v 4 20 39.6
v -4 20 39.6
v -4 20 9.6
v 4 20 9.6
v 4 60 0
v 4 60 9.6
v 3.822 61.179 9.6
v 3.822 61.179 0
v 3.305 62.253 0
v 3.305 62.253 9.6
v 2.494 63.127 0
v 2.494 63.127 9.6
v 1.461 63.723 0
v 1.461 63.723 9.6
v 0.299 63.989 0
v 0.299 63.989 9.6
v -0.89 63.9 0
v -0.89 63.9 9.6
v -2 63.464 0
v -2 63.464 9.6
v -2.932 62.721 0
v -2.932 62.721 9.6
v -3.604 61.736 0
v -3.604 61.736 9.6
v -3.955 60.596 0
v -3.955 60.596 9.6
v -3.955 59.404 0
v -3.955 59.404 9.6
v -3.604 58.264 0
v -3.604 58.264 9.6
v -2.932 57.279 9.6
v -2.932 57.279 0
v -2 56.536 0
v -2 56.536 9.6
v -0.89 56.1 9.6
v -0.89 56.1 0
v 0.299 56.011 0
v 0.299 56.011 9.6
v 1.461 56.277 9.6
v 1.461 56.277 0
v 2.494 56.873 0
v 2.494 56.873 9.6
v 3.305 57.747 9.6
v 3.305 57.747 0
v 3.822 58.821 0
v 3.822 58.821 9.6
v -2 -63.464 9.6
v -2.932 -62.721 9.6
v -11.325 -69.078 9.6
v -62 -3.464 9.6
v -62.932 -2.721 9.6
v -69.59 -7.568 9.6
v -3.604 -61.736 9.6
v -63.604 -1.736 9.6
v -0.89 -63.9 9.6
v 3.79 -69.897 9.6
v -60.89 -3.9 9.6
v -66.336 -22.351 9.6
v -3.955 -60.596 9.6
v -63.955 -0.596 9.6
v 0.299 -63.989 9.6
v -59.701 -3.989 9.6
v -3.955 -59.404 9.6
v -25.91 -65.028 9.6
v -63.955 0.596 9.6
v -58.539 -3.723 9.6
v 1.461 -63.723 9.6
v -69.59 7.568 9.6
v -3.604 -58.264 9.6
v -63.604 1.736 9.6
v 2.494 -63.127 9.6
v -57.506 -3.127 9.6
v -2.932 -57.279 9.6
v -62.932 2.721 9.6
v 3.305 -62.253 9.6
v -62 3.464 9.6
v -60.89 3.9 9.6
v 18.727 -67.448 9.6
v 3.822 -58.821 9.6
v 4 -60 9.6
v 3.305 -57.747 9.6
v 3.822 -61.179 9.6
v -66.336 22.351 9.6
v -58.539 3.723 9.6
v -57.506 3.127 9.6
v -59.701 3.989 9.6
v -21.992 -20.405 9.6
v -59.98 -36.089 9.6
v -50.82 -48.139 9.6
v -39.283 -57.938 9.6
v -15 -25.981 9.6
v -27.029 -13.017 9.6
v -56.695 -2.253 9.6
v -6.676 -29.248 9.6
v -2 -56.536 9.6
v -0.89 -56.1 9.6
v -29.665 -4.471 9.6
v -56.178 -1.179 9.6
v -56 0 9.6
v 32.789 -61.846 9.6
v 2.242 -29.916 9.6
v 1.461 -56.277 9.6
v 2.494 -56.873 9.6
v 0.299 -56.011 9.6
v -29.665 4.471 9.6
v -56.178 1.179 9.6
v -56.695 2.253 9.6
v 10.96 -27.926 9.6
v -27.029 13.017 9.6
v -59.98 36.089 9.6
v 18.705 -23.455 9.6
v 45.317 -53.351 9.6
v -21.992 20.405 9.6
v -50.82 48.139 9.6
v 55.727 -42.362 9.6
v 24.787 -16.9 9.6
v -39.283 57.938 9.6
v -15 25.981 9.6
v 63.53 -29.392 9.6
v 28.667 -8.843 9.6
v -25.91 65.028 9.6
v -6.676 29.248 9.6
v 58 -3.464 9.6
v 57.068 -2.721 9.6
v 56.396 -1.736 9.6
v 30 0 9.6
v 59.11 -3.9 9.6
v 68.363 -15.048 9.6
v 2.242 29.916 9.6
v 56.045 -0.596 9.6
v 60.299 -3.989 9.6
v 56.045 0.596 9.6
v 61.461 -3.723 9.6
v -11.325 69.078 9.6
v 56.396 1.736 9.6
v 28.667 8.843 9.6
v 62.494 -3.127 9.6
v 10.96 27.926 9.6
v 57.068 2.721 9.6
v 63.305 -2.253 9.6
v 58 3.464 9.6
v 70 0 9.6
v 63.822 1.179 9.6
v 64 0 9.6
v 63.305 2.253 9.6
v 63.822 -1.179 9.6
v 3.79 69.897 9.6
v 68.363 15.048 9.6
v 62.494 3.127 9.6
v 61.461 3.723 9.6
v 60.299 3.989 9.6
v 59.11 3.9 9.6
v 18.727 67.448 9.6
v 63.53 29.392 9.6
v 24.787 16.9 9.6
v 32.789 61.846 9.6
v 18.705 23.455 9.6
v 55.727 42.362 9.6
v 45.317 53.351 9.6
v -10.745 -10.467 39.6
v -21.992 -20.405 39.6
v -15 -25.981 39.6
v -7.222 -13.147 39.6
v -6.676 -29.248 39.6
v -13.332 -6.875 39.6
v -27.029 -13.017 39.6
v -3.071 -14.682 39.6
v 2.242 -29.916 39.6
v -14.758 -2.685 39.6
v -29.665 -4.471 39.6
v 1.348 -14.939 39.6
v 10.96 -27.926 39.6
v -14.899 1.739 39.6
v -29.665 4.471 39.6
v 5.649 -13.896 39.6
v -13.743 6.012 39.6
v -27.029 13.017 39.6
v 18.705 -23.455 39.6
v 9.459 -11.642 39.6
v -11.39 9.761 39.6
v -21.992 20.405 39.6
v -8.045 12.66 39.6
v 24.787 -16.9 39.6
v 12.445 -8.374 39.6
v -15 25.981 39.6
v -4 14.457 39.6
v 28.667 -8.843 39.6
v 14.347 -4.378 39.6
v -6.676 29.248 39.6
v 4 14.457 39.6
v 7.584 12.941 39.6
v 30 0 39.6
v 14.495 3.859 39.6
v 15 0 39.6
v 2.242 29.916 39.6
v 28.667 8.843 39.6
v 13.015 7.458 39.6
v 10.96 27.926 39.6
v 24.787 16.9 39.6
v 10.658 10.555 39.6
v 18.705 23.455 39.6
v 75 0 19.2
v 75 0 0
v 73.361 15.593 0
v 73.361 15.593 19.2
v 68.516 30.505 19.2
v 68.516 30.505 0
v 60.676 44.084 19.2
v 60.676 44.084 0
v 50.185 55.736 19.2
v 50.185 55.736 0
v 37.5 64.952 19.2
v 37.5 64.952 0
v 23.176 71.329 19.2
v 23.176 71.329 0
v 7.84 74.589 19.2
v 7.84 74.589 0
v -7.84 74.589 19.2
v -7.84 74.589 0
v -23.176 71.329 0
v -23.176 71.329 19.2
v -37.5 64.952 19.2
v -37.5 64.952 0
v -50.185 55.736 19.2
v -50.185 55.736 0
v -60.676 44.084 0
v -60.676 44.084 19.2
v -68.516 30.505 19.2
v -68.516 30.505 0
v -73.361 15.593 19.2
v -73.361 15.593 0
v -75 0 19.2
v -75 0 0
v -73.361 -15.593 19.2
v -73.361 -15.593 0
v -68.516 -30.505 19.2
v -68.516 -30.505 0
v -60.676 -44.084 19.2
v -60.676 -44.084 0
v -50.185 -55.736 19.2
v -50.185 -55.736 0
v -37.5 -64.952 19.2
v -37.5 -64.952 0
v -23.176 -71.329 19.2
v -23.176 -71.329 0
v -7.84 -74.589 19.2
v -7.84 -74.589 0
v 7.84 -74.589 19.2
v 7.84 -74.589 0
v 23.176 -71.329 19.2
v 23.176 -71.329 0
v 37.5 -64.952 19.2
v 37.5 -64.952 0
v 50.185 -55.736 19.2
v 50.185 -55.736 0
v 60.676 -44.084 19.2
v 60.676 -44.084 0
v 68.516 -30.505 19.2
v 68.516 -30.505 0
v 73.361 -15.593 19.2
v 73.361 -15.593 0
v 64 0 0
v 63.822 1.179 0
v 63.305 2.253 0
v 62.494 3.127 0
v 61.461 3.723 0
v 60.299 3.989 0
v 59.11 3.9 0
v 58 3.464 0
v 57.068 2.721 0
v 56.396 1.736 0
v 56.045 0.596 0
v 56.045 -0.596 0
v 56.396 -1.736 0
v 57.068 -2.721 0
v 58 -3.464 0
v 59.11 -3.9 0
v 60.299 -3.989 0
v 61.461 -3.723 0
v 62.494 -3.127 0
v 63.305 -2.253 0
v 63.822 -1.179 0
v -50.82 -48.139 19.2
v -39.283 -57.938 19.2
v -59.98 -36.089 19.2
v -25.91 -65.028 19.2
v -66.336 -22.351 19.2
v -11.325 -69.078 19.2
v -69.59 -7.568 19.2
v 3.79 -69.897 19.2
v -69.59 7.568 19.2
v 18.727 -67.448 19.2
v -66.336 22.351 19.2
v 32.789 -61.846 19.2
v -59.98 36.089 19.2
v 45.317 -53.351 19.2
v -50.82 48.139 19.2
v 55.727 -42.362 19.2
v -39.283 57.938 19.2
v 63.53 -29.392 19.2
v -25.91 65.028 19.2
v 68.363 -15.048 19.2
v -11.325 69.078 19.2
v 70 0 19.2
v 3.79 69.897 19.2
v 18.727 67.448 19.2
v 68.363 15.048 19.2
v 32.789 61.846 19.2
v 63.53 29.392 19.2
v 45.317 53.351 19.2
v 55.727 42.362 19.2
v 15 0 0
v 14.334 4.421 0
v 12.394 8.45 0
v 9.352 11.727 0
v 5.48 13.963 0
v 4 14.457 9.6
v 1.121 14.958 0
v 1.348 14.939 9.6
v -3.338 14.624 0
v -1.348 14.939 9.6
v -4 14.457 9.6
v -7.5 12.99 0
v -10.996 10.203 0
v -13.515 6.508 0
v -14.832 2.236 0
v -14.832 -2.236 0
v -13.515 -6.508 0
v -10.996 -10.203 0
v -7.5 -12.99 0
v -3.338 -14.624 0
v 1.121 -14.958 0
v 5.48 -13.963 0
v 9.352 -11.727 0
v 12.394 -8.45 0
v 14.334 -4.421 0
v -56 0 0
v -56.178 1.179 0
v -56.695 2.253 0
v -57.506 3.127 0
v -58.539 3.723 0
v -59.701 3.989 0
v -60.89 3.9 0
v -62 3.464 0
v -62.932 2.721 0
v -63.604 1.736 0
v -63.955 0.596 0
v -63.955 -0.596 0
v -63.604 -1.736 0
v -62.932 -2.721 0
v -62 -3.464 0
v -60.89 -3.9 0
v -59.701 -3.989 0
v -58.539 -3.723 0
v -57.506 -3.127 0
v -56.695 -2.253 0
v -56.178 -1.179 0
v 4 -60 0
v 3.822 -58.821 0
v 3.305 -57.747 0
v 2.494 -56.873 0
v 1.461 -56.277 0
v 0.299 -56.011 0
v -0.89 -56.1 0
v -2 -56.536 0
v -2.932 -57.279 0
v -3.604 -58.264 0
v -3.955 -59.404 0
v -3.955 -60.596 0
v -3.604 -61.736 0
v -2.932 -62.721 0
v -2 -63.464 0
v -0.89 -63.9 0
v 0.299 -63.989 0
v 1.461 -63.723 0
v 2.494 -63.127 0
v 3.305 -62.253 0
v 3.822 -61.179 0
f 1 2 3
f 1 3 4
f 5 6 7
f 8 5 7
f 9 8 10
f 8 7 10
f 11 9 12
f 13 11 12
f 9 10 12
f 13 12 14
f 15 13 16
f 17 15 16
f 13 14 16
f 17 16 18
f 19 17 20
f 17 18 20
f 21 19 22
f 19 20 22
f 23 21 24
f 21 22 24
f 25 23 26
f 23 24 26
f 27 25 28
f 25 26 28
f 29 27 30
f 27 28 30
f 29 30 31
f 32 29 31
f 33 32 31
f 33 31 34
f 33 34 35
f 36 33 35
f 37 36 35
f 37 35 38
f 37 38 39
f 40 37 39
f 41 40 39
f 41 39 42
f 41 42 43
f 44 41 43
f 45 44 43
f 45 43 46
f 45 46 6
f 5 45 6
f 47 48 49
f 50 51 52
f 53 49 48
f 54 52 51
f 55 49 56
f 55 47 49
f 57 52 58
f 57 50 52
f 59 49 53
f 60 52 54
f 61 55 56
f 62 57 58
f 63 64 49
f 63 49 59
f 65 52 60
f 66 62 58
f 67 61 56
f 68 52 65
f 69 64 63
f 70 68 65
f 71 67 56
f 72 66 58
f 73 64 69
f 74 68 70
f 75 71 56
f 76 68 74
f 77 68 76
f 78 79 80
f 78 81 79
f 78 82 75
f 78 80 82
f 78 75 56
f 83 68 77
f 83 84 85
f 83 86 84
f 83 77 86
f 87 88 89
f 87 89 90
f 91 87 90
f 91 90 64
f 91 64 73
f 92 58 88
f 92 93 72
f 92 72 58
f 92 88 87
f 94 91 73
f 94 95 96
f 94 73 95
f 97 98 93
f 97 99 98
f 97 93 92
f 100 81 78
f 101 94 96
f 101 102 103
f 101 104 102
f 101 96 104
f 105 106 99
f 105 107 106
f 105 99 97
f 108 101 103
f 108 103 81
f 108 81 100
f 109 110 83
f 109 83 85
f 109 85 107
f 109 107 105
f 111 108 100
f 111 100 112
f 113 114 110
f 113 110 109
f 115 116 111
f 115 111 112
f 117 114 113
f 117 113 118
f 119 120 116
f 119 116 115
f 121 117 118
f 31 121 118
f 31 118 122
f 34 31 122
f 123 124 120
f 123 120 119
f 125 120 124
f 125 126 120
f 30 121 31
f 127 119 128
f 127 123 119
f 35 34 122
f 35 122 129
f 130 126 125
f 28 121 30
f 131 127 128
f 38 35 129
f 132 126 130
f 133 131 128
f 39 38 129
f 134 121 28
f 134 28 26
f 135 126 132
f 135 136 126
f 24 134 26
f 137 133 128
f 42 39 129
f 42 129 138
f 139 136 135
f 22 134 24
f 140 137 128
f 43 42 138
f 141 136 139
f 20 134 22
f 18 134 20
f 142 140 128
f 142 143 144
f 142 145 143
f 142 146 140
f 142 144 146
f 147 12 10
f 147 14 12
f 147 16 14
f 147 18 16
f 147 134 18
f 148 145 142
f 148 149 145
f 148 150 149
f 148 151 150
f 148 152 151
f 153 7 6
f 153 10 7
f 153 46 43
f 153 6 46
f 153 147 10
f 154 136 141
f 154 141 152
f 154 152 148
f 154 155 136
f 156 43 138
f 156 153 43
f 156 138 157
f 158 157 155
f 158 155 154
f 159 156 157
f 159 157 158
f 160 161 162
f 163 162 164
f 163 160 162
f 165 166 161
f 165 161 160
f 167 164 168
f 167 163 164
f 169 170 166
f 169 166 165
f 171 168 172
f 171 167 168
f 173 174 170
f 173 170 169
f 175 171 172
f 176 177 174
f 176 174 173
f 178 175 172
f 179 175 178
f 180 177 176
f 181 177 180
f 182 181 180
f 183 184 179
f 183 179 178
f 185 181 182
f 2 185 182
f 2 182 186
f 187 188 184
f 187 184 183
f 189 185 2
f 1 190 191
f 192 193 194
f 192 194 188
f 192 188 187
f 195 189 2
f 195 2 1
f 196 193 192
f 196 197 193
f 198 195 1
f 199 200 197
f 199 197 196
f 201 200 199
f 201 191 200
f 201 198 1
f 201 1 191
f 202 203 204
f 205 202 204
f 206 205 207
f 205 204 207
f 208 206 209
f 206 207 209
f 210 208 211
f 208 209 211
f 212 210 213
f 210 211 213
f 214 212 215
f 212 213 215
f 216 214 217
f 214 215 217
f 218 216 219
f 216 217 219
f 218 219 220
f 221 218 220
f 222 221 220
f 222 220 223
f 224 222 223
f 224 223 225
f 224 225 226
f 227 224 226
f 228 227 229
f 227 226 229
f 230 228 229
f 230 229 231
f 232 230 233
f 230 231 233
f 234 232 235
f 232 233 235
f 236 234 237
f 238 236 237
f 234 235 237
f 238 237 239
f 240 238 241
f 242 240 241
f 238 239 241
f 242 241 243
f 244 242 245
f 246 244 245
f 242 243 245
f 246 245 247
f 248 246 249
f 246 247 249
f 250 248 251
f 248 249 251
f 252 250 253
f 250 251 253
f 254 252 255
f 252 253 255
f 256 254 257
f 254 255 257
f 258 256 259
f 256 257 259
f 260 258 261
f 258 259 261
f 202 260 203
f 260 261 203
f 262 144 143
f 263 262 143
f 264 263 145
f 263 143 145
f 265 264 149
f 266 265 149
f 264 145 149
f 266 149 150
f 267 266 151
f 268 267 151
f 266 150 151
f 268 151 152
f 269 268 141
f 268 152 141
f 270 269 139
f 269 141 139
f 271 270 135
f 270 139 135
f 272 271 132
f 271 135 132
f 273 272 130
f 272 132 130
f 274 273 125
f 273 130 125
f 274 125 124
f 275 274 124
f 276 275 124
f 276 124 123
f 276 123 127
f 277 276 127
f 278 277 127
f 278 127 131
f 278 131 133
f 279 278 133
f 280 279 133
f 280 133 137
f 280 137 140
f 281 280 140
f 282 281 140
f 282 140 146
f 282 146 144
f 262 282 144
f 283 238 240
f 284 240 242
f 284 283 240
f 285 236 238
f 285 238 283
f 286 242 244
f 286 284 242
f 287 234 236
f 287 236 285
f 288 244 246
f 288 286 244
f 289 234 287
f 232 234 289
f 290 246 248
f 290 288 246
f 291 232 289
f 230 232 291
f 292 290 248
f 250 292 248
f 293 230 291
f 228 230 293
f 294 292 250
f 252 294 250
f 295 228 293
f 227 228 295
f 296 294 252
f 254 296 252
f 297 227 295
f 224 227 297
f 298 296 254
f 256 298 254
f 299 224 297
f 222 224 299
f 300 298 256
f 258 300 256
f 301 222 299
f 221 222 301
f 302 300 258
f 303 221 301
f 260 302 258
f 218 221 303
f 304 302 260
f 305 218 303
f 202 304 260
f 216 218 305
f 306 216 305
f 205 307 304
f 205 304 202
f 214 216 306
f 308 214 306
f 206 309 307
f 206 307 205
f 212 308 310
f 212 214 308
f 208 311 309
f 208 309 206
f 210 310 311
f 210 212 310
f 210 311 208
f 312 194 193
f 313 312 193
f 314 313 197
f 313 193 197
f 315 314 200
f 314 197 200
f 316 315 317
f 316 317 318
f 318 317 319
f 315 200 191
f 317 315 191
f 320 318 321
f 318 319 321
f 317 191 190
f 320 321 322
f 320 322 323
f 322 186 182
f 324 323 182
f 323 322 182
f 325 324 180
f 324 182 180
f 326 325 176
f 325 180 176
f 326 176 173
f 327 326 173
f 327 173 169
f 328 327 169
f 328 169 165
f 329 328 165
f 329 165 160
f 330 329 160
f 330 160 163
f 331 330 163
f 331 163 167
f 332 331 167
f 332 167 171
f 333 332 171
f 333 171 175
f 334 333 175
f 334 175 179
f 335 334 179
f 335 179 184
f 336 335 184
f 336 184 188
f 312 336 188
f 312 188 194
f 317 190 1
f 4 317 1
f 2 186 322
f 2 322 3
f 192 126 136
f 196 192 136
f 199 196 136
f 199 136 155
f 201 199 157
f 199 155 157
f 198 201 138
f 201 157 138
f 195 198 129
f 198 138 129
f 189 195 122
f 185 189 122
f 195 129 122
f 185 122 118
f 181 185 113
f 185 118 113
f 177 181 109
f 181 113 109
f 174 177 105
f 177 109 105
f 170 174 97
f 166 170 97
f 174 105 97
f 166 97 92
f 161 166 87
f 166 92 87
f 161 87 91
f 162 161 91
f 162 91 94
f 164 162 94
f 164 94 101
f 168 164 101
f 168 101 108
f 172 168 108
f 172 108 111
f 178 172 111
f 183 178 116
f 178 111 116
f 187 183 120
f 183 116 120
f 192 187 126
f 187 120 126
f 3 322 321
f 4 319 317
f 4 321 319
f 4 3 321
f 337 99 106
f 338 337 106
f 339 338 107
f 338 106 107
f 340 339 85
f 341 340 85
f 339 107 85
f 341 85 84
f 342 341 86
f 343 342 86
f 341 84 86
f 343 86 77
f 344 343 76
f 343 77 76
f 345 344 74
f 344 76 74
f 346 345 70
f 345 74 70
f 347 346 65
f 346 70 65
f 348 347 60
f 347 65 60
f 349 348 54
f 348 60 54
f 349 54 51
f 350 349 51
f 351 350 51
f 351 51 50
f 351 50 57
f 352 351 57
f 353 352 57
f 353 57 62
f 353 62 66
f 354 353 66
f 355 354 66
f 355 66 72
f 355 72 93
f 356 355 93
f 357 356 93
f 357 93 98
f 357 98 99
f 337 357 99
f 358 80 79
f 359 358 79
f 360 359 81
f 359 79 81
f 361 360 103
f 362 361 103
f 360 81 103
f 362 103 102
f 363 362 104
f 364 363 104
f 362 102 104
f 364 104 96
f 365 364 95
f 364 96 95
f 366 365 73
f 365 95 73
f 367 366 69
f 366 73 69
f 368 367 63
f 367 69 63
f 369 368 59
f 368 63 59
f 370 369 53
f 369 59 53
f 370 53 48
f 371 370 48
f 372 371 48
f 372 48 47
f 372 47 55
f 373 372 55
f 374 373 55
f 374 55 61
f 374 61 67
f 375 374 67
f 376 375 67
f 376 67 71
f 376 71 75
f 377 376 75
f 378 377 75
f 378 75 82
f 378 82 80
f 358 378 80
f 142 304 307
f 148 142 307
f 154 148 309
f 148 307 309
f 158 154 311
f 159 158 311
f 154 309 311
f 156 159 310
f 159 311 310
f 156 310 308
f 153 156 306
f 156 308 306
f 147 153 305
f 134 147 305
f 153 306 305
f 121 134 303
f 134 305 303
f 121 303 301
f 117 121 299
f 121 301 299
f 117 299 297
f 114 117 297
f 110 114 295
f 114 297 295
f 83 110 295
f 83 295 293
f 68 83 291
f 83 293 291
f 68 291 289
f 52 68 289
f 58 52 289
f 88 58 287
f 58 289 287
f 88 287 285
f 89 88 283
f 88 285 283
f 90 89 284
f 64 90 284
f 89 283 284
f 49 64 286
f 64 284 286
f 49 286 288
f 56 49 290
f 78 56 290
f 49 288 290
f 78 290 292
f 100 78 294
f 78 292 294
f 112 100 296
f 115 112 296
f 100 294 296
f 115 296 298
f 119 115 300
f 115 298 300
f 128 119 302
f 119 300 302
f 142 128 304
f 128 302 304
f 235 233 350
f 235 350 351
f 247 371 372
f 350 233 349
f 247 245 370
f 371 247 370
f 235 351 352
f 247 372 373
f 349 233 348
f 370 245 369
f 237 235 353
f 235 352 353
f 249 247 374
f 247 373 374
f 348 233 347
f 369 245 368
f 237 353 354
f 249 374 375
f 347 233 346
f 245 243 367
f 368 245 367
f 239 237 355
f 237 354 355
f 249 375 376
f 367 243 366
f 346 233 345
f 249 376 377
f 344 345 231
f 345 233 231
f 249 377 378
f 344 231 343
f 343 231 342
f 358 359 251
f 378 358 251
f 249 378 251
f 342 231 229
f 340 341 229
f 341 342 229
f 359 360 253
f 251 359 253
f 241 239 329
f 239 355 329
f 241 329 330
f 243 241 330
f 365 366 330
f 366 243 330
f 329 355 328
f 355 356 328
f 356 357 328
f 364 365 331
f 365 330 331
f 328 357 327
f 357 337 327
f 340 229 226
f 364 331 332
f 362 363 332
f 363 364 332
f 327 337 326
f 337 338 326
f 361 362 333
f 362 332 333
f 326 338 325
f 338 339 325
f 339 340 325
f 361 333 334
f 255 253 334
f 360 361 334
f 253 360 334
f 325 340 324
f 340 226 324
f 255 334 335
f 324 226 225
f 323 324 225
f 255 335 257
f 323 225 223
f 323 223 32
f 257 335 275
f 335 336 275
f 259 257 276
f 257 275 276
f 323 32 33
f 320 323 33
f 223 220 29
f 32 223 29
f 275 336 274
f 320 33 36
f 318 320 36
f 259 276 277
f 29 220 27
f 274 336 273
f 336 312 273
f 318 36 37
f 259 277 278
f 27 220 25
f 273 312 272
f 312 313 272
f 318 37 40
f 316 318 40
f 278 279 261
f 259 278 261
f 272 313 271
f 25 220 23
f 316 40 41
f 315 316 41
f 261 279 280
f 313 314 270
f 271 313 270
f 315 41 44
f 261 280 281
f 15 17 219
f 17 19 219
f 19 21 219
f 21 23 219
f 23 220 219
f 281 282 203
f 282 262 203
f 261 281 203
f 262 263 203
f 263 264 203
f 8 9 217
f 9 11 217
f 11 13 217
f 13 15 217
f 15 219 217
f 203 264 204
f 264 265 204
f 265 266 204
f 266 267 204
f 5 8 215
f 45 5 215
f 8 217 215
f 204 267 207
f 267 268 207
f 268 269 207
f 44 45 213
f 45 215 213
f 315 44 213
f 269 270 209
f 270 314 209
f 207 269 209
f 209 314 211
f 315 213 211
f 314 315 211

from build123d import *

# Parameters (mm, degrees)
SKETCH1_R           = 75
BOSS_EXTRUDE3_DEPTH = 19.2
SKETCH3_R           = 70
CUT_EXTRUDE1_DEPTH  = 9.6
SKETCH4_R           = 30
BOSS_EXTRUDE4_DEPTH = 30
SKETCH5_R           = 15
CUT_EXTRUDE2_DEPTH  = 57
SKETCH6_R           = 4
CUT_EXTRUDE3_DEPTH  = 57
SKETCH7_W           = 8
SKETCH7_H           = 10
CUT_EXTRUDE4_DEPTH  = 30


with BuildPart() as part:
    # Sketch1 → Boss-Extrude3 (new body)
    with BuildSketch(Plane.XY):
        Circle(SKETCH1_R)
    extrude(amount=BOSS_EXTRUDE3_DEPTH)

    # Sketch3 → Cut-Extrude1 (cut)
    with BuildSketch(Plane.XY.offset(19.2)):
        Circle(SKETCH3_R)
    extrude(amount=-CUT_EXTRUDE1_DEPTH, mode=Mode.SUBTRACT)

    # Sketch4 → Boss-Extrude4 (add)
    with BuildSketch(Plane.XY.offset(9.6)):
        Circle(SKETCH4_R)
    extrude(amount=BOSS_EXTRUDE4_DEPTH)

    # Sketch5 → Cut-Extrude2 (cut)
    with BuildSketch(Plane.XY.offset(39.6)):
        Circle(SKETCH5_R)
    extrude(amount=-CUT_EXTRUDE2_DEPTH, mode=Mode.SUBTRACT)

    # Sketch6 → Cut-Extrude3 (cut)
    with BuildSketch(Plane.XY.offset(9.6)):
        with Locations((0, 60)):
            Circle(SKETCH6_R)
        with Locations((60, 0)):
            Circle(SKETCH6_R)
        with Locations((0, -60)):
            Circle(SKETCH6_R)
        with Locations((-60, 0)):
            Circle(SKETCH6_R)
    extrude(amount=-CUT_EXTRUDE3_DEPTH, mode=Mode.SUBTRACT)

    # Sketch7 → Cut-Extrude4 (cut)
    with BuildSketch(Plane.XY.offset(39.6)):
        with Locations((0, 15)):
            Rectangle(SKETCH7_W, SKETCH7_H)
    extrude(amount=-CUT_EXTRUDE4_DEPTH, mode=Mode.SUBTRACT)


solid = part.part
